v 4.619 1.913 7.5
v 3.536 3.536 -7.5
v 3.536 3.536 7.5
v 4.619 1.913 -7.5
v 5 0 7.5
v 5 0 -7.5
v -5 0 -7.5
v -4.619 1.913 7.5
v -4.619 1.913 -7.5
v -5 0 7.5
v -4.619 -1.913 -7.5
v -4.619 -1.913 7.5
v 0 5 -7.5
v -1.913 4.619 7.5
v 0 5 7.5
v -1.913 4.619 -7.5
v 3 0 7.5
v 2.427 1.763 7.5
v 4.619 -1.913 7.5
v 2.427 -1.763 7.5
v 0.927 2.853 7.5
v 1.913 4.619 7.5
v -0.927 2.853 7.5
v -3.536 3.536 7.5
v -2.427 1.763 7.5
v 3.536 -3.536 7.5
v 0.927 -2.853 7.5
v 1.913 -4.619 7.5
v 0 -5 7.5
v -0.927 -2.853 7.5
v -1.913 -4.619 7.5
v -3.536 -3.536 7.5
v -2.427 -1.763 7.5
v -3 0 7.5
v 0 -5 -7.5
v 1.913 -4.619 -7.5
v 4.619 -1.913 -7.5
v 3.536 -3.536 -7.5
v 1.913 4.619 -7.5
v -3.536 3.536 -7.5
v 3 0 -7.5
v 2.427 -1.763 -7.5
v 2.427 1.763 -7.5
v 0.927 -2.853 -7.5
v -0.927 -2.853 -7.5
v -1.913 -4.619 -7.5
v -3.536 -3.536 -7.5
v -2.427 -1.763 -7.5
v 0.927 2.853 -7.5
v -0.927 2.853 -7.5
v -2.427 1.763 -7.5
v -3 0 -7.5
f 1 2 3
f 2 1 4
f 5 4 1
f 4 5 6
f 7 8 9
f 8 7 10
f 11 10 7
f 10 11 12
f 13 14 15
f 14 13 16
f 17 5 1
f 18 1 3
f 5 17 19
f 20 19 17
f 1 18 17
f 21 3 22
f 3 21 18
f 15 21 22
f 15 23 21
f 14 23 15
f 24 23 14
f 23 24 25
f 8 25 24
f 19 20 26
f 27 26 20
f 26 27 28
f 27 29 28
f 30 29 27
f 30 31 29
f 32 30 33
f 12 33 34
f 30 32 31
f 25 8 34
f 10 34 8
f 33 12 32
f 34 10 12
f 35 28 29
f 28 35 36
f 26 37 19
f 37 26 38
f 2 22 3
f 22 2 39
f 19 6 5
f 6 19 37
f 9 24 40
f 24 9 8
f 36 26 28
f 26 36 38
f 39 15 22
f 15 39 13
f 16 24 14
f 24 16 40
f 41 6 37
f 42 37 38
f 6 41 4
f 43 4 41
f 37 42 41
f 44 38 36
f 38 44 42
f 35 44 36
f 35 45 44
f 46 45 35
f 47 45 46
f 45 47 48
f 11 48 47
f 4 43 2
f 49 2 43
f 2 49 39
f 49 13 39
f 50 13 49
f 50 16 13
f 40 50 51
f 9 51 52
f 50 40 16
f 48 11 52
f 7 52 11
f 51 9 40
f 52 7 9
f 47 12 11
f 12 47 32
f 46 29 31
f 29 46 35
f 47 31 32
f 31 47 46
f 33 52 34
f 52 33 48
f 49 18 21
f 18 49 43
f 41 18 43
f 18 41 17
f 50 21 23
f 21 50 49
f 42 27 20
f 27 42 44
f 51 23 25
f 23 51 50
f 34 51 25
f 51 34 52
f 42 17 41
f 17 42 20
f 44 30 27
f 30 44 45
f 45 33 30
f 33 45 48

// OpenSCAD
// Parameters
length = 15; //[8:30:1]
center = 1; //[0:1:1]
forced_id = 0; //[0:50:0.5]
od_mm = 10; //[5:20:0.5]
id_mm = 6; //[2:18:0.5]
eps = 1; //[0.5:2:0.1]

// Tubing - complete geometry
module tubing() {
  color([0.2, 0.2, 0.2]) { // Neoprene-like color
    if (center == 1) {
      difference() {
        // Outer cylinder centered
        cylinder(h=length, r=od_mm/2, center=true);
        // Inner cylinder centered
        cylinder(h=length + 2*eps, r=((forced_id > 0) ? forced_id : id_mm)/2, center=true);
      }
    } else {
      difference() {
        // Outer cylinder uncentered
        translate([0, 0, length/2])
          cylinder(h=length, r=od_mm/2, center=true);
        // Inner cylinder uncentered
        translate([0, 0, length/2])
          cylinder(h=length + 2*eps, r=((forced_id > 0) ? forced_id : id_mm)/2, center=true);
      }
    }
  }
}

// Assembly
module assembly() {
  tubing();
}

assembly();
